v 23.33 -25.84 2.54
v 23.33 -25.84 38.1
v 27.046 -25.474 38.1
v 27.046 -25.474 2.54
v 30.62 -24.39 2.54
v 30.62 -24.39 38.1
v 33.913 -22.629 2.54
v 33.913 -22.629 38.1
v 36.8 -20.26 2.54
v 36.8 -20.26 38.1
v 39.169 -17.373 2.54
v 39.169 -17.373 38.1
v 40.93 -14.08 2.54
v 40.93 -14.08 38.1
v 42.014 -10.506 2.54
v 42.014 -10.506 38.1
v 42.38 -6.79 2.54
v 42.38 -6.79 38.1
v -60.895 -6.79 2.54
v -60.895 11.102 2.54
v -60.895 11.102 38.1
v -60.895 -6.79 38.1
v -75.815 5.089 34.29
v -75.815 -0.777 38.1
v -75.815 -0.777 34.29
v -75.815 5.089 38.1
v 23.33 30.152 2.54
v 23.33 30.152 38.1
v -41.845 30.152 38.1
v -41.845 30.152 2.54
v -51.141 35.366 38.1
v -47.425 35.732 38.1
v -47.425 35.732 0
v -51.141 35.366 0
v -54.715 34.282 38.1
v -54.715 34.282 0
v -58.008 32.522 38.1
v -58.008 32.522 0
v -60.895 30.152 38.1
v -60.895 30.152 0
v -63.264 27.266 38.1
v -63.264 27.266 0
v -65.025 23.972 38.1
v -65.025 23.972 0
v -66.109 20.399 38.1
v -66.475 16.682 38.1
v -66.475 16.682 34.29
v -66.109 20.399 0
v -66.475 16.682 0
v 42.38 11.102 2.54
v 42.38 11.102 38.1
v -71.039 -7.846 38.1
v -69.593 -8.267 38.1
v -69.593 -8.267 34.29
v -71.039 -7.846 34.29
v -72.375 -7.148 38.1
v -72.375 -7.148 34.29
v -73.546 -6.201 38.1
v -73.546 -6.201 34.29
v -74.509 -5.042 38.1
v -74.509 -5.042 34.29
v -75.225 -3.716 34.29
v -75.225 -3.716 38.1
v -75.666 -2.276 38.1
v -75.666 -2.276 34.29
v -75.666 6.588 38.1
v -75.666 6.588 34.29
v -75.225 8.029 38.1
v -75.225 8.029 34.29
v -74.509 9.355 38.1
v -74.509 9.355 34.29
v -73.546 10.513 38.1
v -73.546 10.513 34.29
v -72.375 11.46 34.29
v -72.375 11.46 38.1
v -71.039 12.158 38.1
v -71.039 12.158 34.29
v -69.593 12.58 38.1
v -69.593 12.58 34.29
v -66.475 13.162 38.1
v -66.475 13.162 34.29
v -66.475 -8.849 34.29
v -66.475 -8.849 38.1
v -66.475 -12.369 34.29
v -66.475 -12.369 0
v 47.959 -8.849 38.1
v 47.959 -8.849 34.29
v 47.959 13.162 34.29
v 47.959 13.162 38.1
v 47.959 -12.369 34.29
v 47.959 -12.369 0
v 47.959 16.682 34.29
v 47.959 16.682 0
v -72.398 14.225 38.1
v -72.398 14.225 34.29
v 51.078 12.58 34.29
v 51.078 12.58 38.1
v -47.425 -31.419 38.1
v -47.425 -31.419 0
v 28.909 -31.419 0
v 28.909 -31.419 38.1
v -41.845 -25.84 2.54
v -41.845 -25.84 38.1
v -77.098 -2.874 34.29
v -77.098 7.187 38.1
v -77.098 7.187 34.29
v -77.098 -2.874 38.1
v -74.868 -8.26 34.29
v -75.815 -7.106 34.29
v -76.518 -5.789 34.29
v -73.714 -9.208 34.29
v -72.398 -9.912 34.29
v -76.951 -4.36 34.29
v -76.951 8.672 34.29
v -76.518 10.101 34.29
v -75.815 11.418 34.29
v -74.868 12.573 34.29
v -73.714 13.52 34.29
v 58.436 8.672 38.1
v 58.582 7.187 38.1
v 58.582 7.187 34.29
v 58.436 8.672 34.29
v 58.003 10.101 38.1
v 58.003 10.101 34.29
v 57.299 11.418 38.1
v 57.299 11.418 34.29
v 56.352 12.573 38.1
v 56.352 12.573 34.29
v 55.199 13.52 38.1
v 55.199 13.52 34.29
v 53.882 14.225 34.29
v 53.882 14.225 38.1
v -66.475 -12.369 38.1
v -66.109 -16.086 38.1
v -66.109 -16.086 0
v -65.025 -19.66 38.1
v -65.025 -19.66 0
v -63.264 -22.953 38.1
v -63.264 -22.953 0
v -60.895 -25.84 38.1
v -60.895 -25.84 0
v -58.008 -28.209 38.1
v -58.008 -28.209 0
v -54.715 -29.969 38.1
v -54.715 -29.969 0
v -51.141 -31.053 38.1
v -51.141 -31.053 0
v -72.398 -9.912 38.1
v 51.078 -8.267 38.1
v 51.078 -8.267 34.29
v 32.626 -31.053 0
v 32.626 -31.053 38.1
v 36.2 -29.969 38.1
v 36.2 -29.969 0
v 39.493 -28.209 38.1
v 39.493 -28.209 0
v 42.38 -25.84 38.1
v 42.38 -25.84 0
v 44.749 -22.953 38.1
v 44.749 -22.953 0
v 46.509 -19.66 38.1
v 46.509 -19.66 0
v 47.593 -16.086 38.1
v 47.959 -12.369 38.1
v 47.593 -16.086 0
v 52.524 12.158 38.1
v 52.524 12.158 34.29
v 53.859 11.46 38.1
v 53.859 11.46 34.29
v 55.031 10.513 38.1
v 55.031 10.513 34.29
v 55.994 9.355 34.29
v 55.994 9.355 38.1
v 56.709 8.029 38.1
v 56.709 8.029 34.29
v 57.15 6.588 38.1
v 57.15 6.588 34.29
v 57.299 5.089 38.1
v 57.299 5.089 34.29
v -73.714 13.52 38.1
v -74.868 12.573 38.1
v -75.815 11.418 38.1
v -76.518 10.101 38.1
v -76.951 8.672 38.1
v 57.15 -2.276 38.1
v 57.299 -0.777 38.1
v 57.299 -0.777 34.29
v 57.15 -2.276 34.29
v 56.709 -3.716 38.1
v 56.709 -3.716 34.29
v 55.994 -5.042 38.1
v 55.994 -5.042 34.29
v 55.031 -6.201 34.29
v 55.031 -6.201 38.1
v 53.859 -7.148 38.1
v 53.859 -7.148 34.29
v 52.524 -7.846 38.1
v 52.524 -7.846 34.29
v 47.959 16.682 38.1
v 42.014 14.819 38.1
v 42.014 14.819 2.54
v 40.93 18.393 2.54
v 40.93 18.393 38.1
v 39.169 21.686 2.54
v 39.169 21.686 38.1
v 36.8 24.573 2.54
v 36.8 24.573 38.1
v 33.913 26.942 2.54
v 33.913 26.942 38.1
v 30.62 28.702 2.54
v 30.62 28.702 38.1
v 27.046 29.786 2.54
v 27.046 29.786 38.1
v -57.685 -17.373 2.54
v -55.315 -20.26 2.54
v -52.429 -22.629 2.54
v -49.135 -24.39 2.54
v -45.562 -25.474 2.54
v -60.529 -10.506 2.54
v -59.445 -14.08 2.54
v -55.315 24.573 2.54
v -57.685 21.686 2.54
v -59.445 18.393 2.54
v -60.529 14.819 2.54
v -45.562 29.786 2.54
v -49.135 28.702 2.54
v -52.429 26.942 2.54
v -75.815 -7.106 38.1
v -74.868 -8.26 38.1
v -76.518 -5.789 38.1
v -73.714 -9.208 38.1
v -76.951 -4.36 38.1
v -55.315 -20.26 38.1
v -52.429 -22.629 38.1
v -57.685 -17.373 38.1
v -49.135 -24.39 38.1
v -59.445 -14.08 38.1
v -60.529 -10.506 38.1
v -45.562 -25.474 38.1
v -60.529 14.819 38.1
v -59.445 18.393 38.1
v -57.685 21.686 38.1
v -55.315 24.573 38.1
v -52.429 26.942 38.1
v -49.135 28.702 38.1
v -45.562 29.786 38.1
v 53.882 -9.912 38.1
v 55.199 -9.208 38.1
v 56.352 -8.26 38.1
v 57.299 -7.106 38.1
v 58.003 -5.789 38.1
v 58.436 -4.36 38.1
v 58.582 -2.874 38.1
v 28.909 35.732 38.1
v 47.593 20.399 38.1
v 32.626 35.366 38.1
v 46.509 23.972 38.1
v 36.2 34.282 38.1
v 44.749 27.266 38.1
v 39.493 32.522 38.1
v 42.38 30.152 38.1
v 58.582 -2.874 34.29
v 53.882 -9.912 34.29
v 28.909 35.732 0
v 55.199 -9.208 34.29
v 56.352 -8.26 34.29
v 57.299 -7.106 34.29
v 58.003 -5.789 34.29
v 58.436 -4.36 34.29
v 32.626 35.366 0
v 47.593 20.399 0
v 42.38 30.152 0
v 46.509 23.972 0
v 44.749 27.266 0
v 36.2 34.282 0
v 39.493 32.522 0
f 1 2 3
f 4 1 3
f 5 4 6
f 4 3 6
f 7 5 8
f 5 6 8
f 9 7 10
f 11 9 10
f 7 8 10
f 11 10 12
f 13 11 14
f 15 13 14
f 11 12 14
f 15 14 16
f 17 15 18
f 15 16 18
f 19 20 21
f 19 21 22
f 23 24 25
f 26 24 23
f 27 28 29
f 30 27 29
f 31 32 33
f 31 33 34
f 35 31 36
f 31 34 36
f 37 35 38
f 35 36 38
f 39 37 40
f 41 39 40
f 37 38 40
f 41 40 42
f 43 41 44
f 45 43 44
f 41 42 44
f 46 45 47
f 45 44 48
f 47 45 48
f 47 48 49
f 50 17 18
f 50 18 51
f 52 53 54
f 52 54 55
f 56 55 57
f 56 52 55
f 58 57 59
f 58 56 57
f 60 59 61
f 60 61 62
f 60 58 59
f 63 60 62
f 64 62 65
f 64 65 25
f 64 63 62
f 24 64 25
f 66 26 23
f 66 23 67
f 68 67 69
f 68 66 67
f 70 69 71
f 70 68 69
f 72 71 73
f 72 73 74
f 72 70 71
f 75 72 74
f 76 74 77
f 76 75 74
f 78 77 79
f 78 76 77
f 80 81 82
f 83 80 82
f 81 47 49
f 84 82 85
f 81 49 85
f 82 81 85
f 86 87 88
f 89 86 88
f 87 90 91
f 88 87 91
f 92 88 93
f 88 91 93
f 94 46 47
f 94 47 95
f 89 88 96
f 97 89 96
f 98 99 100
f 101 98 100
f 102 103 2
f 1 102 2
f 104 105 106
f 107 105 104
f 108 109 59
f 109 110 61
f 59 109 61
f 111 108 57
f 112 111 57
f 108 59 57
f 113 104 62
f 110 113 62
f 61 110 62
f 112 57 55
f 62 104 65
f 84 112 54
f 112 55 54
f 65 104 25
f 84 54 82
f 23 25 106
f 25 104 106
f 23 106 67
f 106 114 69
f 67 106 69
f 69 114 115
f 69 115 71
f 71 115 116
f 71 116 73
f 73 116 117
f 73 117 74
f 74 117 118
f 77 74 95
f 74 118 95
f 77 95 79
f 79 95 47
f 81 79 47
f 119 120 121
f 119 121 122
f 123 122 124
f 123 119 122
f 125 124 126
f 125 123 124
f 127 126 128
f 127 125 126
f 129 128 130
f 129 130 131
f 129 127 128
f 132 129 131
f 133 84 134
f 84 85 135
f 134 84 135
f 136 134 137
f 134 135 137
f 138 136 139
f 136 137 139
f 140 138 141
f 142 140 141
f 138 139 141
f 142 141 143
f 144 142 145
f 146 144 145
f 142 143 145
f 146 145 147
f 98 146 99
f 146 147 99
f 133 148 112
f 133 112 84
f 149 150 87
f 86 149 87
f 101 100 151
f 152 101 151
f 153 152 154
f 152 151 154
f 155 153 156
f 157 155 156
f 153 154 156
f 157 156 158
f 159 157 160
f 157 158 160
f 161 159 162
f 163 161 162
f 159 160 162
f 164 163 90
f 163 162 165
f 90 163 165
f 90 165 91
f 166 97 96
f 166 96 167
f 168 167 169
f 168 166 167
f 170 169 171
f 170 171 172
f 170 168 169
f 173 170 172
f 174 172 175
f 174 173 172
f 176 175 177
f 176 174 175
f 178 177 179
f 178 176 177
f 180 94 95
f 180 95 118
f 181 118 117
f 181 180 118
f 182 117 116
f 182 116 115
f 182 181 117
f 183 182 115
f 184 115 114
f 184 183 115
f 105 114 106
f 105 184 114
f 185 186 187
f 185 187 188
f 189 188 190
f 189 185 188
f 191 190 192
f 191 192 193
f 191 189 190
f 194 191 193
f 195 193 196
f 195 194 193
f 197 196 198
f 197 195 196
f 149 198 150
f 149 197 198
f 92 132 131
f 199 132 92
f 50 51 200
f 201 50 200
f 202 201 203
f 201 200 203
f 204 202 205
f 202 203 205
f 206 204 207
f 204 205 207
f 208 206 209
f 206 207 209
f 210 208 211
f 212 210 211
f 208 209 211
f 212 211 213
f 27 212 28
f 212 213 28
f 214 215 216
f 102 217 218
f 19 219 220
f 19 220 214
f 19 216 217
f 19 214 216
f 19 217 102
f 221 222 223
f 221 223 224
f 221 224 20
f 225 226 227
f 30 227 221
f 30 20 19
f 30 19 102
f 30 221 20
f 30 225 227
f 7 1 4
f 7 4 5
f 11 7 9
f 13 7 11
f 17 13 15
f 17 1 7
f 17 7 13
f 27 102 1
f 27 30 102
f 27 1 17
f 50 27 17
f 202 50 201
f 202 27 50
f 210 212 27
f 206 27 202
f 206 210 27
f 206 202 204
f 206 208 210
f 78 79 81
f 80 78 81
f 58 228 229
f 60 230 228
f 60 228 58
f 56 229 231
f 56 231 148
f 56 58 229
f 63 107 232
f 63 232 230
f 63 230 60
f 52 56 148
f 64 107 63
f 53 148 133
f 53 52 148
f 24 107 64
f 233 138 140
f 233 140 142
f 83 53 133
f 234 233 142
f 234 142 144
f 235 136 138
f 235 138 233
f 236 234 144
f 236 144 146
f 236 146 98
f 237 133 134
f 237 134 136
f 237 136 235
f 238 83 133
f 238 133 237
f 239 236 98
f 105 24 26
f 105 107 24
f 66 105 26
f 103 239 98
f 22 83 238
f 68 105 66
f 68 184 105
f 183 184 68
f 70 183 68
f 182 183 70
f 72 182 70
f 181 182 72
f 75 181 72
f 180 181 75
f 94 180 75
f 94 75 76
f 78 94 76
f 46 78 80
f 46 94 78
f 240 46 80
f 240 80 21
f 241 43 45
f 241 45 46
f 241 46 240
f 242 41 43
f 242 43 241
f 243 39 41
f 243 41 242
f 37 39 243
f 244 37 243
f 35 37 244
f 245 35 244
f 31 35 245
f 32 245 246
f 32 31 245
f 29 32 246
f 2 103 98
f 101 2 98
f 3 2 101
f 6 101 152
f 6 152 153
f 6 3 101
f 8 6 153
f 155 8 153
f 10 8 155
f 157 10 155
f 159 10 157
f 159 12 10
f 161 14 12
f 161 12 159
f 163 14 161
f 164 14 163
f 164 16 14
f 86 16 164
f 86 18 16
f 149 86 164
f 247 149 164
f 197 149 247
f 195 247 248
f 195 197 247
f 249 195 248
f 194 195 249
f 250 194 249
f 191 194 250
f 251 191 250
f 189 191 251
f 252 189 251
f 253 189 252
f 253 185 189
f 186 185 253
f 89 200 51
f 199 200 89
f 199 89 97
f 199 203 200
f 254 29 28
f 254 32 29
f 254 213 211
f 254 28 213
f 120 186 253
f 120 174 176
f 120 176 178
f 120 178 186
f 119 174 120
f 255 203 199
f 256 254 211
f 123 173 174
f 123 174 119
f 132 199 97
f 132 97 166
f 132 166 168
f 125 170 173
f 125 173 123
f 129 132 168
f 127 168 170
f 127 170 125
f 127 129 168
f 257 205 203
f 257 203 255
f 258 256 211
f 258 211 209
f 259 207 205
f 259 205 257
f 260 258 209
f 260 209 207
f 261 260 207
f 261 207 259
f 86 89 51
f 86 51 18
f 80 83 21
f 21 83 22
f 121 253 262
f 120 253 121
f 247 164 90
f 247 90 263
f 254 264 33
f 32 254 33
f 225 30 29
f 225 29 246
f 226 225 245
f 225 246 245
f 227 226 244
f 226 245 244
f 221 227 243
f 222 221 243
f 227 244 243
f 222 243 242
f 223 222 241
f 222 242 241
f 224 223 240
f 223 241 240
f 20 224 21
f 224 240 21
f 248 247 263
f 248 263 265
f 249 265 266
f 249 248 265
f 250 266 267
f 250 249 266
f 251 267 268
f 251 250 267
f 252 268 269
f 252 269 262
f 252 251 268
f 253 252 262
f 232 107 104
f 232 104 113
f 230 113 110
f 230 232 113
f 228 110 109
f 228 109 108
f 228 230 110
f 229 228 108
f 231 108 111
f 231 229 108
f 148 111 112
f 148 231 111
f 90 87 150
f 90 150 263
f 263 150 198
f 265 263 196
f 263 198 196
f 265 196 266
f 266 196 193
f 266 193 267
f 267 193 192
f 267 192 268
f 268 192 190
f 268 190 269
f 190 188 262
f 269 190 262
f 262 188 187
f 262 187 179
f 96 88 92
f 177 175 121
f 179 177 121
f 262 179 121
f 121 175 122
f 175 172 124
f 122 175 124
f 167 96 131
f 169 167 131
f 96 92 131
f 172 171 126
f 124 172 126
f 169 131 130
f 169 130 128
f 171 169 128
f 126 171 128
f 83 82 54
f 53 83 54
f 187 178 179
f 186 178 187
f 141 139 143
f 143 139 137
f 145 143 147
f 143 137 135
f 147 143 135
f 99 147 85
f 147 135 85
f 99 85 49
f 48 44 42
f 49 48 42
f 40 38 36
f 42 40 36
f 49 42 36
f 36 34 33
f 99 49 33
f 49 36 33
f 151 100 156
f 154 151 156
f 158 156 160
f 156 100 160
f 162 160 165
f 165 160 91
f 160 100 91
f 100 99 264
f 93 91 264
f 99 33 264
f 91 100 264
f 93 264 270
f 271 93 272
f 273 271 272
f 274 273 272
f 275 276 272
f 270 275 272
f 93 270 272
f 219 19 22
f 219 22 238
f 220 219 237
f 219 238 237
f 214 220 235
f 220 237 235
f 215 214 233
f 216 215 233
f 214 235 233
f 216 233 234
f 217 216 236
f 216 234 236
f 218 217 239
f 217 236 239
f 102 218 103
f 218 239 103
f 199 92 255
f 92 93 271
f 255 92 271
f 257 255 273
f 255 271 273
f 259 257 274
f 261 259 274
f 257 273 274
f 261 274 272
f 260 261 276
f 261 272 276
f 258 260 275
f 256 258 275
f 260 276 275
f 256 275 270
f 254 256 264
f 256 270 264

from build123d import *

# Parameters (mm, degrees)
F1_DEPTH = 38.1
F3_DEPTH = 35.56
F5_DEPTH = 3.81


with BuildPart() as f1:
    # F0 (on Top) → F1 (new body)
    with BuildSketch(Plane.XY):
        with BuildLine():
            Line((28.9094160199, 35.7320394768), (-47.4246910334, 35.7320394768))
            ThreePointArc((-47.4246910334, 35.7320394768), (-60.895075215, 30.1524236584), (-66.4746910334, 16.6820394768))
            Line((-66.4746910334, 16.6820394768), (-66.4746910334, -12.3694256604))
            ThreePointArc((-66.4746910334, -12.3694256604), (-60.895075215, -25.839809842), (-47.4246910334, -31.4194256604))
            Line((-47.4246910334, -31.4194256604), (28.9094160199, -31.4194256604))
            ThreePointArc((28.9094160199, -31.4194256604), (42.3798002015, -25.839809842), (47.9594160199, -12.3694256604))
            Line((47.9594160199, -12.3694256604), (47.9594160199, 16.6820394768))
            ThreePointArc((47.9594160199, 16.6820394768), (42.3798002015, 30.1524236584), (28.9094160199, 35.7320394768))
        make_face()
    extrude(amount=F1_DEPTH)

    # F2 (on face) → F3 (cut)
    with BuildSketch(Plane.XY.offset(38.1)):
        with BuildLine():
            Line((23.3298002015, 30.1524236584), (-41.845075215, 30.1524236584))
            ThreePointArc((-41.845075215, 30.1524236584), (-55.3154593966, 24.57280784), (-60.895075215, 11.1024236584))
            Line((-60.895075215, 11.1024236584), (-60.895075215, -6.789809842))
            ThreePointArc((-60.895075215, -6.789809842), (-55.3154593966, -20.2601940236), (-41.845075215, -25.839809842))
            Line((-41.845075215, -25.839809842), (23.3298002015, -25.839809842))
            ThreePointArc((23.3298002015, -25.839809842), (36.8001843831, -20.2601940236), (42.3798002015, -6.789809842))
            Line((42.3798002015, -6.789809842), (42.3798002015, 11.1024236584))
            ThreePointArc((42.3798002015, 11.1024236584), (36.8001843831, 24.57280784), (23.3298002015, 30.1524236584))
        make_face()
    extrude(amount=-F3_DEPTH, mode=Mode.SUBTRACT)

    # F4 (on face) → F5 (join)
    with BuildSketch(Plane.XY.offset(38.1)):
        with BuildLine():
            Line((47.9594160199, -8.8493684307), (47.9594160199, -12.3694256604))
            Line((47.9594160199, -12.3694256604), (53.8822529313, -9.912228523))
            ThreePointArc((53.8822529313, -9.912228523), (57.2992531994, -7.1055718841), (58.5822723806, -2.87389679))
            Line((58.5822723806, -2.87389679), (58.5822723806, 7.1865106064))
            ThreePointArc((58.5822723806, 7.1865106064), (57.2992531994, 11.4181857005), (53.8822529313, 14.2248423394))
            Line((53.8822529313, 14.2248423394), (47.9594160199, 16.6820394768))
            Line((47.9594160199, 16.6820394768), (47.9594160199, 13.1619822471))
            Line((47.9594160199, 13.1619822471), (51.0777804109, 12.5797672736))
            ThreePointArc((51.0777804109, 12.5797672736), (55.5410437685, 9.9578611105), (57.2992531994, 5.0892051025))
            Line((57.2992531994, 5.0892051025), (57.2992531994, -0.7765912861))
            ThreePointArc((57.2992531994, -0.7765912861), (55.5410437685, -5.6452472941), (51.0777804109, -8.2671534572))
            Line((51.0777804109, -8.2671534572), (47.9594160199, -8.8493684307))
        make_face()
        with BuildLine():
            Line((-72.3975279448, -9.912228523), (-66.4746910334, -12.3694256604))
            Line((-66.4746910334, -12.3694256604), (-66.4746910334, -8.8493684307))
            Line((-66.4746910334, -8.8493684307), (-69.5930554243, -8.2671534572))
            ThreePointArc((-69.5930554243, -8.2671534572), (-74.0563187819, -5.6452472941), (-75.8145282129, -0.7765912861))
            Line((-75.8145282129, -0.7765912861), (-75.8145282129, 5.0892051025))
            ThreePointArc((-75.8145282129, 5.0892051025), (-74.0563187819, 9.9578611105), (-69.5930554243, 12.5797672736))
            Line((-69.5930554243, 12.5797672736), (-66.4746910334, 13.1619822471))
            Line((-66.4746910334, 13.1619822471), (-66.4746910334, 16.6820394768))
            Line((-66.4746910334, 16.6820394768), (-72.3975279448, 14.2248423394))
            ThreePointArc((-72.3975279448, 14.2248423394), (-75.8145282129, 11.4181857005), (-77.097547394, 7.1865106064))
            Line((-77.097547394, 7.1865106064), (-77.097547394, -2.87389679))
            ThreePointArc((-77.097547394, -2.87389679), (-75.8145282129, -7.1055718841), (-72.3975279448, -9.912228523))
        make_face()
    extrude(amount=-F5_DEPTH)


solid = f1.part
